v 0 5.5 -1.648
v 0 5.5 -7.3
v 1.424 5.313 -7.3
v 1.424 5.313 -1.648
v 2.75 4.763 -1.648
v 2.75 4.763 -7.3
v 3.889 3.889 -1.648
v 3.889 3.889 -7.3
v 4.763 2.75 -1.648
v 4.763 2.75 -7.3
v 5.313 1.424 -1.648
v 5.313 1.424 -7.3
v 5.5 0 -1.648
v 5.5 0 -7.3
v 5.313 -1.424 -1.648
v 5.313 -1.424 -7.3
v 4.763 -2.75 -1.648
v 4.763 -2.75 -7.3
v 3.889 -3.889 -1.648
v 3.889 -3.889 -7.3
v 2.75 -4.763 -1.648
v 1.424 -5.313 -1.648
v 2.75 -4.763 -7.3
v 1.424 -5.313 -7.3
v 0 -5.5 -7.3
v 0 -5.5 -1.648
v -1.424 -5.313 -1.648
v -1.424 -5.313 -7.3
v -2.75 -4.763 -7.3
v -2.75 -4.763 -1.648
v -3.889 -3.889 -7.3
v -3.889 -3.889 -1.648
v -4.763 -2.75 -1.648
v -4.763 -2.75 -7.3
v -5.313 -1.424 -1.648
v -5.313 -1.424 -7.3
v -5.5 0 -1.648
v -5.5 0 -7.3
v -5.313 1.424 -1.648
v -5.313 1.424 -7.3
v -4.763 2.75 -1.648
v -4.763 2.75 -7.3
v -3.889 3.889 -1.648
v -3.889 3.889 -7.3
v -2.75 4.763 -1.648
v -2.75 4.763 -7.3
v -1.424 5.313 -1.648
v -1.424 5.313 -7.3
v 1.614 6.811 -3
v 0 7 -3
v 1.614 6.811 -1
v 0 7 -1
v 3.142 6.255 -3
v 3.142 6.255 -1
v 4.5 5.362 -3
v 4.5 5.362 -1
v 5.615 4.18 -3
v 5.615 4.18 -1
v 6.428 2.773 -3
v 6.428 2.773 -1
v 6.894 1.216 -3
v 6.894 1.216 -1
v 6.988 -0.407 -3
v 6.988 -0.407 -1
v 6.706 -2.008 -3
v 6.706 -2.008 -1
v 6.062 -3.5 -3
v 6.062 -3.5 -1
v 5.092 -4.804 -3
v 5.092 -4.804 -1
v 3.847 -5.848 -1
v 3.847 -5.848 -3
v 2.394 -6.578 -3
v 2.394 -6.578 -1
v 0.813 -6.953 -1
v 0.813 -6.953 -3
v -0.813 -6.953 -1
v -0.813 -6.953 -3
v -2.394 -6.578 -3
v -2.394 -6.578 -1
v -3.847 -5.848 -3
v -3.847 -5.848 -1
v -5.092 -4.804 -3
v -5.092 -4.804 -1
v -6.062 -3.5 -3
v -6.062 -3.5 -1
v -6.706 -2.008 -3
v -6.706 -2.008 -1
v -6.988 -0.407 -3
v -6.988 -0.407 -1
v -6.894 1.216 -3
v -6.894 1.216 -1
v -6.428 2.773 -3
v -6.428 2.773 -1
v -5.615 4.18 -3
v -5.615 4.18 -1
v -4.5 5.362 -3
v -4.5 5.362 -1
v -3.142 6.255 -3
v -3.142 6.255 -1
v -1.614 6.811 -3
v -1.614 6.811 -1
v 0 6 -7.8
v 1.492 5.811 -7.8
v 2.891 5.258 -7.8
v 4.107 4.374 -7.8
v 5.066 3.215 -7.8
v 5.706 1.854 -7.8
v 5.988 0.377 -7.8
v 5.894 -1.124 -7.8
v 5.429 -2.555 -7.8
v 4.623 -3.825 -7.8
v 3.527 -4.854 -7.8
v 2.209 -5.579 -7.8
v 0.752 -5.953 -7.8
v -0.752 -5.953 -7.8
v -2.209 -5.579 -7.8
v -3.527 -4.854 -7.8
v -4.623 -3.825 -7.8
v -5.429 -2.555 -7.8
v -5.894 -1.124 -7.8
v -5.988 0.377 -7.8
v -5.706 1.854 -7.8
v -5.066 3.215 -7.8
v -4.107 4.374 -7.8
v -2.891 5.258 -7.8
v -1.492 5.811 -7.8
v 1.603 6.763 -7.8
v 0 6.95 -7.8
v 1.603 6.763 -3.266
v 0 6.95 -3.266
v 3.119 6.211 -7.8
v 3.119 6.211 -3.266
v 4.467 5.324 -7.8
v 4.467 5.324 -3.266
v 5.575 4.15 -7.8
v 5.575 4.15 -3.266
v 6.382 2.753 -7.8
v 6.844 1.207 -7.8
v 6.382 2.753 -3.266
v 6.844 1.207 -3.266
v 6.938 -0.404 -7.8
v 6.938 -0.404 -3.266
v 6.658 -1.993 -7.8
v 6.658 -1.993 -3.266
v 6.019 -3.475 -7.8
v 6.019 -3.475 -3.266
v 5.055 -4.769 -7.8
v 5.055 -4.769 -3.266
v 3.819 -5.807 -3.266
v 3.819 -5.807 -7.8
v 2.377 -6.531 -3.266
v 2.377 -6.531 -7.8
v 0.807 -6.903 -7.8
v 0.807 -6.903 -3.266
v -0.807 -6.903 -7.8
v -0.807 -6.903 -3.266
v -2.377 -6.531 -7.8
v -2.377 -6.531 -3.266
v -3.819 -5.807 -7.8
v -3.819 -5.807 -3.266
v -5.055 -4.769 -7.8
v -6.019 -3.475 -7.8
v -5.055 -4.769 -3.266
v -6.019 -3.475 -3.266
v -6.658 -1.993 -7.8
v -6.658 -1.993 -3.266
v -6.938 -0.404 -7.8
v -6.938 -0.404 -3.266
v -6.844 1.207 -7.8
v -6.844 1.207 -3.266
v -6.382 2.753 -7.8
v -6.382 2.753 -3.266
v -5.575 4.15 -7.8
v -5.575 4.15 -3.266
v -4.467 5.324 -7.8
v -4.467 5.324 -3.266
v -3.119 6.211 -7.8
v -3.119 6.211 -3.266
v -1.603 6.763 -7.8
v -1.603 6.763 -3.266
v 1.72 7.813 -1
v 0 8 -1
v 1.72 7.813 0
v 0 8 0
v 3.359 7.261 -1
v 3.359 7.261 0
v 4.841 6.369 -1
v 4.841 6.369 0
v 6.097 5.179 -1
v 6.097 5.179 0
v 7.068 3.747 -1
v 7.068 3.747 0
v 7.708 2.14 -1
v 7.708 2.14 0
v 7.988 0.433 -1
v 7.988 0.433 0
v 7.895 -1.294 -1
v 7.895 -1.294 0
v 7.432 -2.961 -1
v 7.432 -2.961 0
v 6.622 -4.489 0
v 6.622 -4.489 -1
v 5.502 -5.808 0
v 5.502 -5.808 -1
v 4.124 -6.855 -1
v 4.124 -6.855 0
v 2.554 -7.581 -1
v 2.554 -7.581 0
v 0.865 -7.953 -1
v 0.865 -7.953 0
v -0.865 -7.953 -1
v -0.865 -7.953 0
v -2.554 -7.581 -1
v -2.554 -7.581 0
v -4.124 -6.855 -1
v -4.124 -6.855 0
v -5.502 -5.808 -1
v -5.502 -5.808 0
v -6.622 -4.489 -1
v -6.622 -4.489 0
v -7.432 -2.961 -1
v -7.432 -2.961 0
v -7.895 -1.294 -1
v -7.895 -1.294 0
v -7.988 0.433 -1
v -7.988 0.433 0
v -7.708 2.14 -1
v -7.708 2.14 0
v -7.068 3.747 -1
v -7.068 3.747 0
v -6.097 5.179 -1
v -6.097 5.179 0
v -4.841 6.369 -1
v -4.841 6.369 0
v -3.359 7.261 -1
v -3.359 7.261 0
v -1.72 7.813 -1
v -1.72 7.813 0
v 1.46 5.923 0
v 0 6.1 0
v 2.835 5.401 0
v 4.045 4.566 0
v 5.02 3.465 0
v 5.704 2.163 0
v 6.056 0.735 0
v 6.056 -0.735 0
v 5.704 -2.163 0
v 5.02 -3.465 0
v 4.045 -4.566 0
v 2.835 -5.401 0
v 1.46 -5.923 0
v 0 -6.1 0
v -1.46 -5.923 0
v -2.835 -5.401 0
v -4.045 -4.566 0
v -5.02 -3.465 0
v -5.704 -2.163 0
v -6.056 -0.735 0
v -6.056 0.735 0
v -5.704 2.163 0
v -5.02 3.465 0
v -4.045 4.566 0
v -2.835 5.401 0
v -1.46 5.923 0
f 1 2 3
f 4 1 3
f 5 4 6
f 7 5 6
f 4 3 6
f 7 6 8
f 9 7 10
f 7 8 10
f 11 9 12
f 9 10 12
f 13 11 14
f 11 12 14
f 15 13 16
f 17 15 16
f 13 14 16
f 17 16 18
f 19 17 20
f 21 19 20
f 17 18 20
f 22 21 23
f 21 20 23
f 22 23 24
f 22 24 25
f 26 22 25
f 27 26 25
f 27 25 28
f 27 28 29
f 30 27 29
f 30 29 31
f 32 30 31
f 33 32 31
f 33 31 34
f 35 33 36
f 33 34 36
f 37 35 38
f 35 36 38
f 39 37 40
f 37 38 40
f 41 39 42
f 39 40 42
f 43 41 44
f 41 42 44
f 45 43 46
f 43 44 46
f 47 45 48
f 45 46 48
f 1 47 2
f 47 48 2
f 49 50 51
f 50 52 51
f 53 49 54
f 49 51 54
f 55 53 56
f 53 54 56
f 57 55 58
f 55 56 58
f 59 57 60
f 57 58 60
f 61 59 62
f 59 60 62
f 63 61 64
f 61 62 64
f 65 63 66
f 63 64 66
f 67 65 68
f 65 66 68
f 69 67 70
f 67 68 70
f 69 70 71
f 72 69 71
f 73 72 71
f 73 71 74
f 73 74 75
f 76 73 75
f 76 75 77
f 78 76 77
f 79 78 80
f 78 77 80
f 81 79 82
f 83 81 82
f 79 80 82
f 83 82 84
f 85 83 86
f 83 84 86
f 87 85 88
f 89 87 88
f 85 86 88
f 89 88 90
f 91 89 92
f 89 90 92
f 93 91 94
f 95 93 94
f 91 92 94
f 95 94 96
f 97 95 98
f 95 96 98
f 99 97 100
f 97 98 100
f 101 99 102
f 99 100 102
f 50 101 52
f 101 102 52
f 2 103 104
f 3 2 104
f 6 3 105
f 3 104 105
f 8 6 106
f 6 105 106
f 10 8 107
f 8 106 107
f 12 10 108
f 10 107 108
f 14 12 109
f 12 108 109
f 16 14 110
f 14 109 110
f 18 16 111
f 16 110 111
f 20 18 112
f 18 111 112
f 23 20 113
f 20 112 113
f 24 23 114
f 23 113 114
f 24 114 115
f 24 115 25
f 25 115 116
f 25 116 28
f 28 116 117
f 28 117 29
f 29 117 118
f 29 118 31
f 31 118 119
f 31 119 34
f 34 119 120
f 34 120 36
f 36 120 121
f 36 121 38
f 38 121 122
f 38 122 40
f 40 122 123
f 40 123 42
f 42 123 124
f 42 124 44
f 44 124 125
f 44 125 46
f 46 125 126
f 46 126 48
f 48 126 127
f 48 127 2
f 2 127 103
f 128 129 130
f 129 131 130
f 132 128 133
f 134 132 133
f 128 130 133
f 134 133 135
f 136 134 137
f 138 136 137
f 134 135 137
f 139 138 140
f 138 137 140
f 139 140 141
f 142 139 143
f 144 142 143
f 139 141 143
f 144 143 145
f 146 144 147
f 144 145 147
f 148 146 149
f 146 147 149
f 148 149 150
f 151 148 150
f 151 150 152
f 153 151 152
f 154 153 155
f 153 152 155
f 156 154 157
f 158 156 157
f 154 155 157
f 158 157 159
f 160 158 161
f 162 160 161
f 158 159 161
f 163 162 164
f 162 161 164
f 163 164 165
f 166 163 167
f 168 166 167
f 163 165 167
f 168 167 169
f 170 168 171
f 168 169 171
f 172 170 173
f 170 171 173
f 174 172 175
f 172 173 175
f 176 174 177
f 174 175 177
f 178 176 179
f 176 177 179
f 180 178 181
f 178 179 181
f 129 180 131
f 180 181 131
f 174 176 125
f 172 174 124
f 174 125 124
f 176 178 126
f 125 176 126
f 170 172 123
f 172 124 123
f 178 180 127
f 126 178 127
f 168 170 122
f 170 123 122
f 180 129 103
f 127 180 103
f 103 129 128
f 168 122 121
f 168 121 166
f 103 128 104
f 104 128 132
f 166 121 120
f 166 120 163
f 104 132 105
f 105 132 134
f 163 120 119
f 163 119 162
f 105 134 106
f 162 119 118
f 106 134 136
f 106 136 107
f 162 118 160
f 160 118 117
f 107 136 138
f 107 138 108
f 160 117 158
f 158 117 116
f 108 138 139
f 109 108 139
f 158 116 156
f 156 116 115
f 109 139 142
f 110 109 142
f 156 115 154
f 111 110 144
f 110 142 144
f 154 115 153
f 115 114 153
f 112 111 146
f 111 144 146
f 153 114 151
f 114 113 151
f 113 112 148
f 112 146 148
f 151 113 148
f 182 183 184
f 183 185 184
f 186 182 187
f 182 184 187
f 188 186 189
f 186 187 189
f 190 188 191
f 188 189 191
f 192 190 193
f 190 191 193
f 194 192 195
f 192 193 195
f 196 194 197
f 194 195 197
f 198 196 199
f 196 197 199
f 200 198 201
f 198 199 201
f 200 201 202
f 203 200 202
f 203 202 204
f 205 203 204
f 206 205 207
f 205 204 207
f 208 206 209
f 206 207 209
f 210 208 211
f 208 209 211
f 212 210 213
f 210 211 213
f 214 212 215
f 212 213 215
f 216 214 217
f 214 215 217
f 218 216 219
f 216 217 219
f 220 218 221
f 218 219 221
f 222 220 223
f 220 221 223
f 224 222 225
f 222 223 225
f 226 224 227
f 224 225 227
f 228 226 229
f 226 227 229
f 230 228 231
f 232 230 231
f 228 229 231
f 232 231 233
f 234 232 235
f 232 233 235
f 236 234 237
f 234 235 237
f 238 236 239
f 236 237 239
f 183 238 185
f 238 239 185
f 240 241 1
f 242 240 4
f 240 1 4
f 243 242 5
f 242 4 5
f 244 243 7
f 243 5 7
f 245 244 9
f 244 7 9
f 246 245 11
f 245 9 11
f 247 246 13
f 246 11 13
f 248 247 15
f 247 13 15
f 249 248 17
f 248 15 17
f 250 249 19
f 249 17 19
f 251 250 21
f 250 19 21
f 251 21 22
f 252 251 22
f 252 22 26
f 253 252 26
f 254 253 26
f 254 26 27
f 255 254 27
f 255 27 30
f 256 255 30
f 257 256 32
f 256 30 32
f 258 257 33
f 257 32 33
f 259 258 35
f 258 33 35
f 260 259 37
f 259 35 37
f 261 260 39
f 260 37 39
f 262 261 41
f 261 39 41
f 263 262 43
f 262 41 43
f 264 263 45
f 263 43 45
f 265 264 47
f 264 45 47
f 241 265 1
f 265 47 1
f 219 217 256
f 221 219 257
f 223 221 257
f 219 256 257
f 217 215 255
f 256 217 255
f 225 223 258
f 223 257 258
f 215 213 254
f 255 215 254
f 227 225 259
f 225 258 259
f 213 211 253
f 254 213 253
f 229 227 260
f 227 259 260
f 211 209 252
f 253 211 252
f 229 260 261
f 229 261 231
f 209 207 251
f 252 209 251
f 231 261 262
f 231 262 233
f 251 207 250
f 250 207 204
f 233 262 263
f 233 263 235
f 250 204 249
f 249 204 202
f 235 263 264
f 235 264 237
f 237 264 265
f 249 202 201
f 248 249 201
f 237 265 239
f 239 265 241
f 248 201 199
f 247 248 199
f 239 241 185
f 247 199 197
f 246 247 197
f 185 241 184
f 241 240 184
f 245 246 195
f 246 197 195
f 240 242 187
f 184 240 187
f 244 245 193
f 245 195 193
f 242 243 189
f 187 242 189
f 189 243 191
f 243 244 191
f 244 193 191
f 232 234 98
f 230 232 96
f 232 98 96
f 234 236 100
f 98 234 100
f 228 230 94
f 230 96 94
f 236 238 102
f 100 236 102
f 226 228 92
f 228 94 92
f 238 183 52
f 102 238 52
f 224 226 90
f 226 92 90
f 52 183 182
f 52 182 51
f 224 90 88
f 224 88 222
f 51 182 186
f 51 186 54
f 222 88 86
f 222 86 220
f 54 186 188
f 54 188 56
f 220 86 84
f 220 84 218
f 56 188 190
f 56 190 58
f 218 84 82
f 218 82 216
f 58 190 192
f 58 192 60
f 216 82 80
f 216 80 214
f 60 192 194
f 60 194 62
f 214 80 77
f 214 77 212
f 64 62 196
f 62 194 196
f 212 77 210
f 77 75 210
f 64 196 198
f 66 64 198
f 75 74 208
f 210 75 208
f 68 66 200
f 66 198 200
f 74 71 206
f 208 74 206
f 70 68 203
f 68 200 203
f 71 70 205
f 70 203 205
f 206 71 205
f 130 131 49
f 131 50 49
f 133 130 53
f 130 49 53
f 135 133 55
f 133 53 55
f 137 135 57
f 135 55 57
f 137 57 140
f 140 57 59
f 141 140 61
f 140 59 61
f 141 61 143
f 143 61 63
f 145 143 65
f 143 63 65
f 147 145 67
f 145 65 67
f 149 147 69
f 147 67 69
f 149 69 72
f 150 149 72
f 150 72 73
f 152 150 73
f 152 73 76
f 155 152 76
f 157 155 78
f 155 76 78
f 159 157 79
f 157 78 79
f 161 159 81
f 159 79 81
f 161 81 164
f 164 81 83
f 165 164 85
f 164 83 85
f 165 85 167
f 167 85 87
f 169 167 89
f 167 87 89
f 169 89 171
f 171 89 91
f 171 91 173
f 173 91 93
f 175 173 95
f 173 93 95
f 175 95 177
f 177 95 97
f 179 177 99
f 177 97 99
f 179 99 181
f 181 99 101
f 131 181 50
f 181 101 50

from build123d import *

# Parameters (mm, degrees)
CHAMFER_1_SIZE  = 0.5
CHAMFER_2_SIZE  = 0.6
CHAMFER_2_SIZE2 = 1.648486452


with BuildPart() as part:
    # Эскиз1 → Повернуть1 (revolve)
    with BuildSketch(Plane(origin=(0, 0, 0), x_dir=(0, 0, -1), z_dir=(1, 0, 0))):
        Polygon((0, 5.5), (7.8, 5.5), (7.8, 6.95), (3.265574507, 6.95), (3, 7), (1, 7), (1, 8), (0, 8), align=None)
    revolve(axis=Axis((0, 0, 0), (0, 0, -1)))

    # Фаска1
    chamfer_1_edges = [part.edges().sort_by_distance(p)[0] for p in [
        (0, -5.5, -7.8),
    ]]
    chamfer(chamfer_1_edges, length=CHAMFER_1_SIZE)

    # Фаска2
    chamfer_2_edges = [part.edges().sort_by_distance(p)[0] for p in [
        (0, -5.5, 0),
    ]]
    chamfer_2_side = [part.faces().sort_by_distance(p)[0] for p in [
        (0, -7.77372583, 0),
    ]]
    chamfer(chamfer_2_edges, length=CHAMFER_2_SIZE, length2=CHAMFER_2_SIZE2, reference=chamfer_2_side[0])


solid = part.part
